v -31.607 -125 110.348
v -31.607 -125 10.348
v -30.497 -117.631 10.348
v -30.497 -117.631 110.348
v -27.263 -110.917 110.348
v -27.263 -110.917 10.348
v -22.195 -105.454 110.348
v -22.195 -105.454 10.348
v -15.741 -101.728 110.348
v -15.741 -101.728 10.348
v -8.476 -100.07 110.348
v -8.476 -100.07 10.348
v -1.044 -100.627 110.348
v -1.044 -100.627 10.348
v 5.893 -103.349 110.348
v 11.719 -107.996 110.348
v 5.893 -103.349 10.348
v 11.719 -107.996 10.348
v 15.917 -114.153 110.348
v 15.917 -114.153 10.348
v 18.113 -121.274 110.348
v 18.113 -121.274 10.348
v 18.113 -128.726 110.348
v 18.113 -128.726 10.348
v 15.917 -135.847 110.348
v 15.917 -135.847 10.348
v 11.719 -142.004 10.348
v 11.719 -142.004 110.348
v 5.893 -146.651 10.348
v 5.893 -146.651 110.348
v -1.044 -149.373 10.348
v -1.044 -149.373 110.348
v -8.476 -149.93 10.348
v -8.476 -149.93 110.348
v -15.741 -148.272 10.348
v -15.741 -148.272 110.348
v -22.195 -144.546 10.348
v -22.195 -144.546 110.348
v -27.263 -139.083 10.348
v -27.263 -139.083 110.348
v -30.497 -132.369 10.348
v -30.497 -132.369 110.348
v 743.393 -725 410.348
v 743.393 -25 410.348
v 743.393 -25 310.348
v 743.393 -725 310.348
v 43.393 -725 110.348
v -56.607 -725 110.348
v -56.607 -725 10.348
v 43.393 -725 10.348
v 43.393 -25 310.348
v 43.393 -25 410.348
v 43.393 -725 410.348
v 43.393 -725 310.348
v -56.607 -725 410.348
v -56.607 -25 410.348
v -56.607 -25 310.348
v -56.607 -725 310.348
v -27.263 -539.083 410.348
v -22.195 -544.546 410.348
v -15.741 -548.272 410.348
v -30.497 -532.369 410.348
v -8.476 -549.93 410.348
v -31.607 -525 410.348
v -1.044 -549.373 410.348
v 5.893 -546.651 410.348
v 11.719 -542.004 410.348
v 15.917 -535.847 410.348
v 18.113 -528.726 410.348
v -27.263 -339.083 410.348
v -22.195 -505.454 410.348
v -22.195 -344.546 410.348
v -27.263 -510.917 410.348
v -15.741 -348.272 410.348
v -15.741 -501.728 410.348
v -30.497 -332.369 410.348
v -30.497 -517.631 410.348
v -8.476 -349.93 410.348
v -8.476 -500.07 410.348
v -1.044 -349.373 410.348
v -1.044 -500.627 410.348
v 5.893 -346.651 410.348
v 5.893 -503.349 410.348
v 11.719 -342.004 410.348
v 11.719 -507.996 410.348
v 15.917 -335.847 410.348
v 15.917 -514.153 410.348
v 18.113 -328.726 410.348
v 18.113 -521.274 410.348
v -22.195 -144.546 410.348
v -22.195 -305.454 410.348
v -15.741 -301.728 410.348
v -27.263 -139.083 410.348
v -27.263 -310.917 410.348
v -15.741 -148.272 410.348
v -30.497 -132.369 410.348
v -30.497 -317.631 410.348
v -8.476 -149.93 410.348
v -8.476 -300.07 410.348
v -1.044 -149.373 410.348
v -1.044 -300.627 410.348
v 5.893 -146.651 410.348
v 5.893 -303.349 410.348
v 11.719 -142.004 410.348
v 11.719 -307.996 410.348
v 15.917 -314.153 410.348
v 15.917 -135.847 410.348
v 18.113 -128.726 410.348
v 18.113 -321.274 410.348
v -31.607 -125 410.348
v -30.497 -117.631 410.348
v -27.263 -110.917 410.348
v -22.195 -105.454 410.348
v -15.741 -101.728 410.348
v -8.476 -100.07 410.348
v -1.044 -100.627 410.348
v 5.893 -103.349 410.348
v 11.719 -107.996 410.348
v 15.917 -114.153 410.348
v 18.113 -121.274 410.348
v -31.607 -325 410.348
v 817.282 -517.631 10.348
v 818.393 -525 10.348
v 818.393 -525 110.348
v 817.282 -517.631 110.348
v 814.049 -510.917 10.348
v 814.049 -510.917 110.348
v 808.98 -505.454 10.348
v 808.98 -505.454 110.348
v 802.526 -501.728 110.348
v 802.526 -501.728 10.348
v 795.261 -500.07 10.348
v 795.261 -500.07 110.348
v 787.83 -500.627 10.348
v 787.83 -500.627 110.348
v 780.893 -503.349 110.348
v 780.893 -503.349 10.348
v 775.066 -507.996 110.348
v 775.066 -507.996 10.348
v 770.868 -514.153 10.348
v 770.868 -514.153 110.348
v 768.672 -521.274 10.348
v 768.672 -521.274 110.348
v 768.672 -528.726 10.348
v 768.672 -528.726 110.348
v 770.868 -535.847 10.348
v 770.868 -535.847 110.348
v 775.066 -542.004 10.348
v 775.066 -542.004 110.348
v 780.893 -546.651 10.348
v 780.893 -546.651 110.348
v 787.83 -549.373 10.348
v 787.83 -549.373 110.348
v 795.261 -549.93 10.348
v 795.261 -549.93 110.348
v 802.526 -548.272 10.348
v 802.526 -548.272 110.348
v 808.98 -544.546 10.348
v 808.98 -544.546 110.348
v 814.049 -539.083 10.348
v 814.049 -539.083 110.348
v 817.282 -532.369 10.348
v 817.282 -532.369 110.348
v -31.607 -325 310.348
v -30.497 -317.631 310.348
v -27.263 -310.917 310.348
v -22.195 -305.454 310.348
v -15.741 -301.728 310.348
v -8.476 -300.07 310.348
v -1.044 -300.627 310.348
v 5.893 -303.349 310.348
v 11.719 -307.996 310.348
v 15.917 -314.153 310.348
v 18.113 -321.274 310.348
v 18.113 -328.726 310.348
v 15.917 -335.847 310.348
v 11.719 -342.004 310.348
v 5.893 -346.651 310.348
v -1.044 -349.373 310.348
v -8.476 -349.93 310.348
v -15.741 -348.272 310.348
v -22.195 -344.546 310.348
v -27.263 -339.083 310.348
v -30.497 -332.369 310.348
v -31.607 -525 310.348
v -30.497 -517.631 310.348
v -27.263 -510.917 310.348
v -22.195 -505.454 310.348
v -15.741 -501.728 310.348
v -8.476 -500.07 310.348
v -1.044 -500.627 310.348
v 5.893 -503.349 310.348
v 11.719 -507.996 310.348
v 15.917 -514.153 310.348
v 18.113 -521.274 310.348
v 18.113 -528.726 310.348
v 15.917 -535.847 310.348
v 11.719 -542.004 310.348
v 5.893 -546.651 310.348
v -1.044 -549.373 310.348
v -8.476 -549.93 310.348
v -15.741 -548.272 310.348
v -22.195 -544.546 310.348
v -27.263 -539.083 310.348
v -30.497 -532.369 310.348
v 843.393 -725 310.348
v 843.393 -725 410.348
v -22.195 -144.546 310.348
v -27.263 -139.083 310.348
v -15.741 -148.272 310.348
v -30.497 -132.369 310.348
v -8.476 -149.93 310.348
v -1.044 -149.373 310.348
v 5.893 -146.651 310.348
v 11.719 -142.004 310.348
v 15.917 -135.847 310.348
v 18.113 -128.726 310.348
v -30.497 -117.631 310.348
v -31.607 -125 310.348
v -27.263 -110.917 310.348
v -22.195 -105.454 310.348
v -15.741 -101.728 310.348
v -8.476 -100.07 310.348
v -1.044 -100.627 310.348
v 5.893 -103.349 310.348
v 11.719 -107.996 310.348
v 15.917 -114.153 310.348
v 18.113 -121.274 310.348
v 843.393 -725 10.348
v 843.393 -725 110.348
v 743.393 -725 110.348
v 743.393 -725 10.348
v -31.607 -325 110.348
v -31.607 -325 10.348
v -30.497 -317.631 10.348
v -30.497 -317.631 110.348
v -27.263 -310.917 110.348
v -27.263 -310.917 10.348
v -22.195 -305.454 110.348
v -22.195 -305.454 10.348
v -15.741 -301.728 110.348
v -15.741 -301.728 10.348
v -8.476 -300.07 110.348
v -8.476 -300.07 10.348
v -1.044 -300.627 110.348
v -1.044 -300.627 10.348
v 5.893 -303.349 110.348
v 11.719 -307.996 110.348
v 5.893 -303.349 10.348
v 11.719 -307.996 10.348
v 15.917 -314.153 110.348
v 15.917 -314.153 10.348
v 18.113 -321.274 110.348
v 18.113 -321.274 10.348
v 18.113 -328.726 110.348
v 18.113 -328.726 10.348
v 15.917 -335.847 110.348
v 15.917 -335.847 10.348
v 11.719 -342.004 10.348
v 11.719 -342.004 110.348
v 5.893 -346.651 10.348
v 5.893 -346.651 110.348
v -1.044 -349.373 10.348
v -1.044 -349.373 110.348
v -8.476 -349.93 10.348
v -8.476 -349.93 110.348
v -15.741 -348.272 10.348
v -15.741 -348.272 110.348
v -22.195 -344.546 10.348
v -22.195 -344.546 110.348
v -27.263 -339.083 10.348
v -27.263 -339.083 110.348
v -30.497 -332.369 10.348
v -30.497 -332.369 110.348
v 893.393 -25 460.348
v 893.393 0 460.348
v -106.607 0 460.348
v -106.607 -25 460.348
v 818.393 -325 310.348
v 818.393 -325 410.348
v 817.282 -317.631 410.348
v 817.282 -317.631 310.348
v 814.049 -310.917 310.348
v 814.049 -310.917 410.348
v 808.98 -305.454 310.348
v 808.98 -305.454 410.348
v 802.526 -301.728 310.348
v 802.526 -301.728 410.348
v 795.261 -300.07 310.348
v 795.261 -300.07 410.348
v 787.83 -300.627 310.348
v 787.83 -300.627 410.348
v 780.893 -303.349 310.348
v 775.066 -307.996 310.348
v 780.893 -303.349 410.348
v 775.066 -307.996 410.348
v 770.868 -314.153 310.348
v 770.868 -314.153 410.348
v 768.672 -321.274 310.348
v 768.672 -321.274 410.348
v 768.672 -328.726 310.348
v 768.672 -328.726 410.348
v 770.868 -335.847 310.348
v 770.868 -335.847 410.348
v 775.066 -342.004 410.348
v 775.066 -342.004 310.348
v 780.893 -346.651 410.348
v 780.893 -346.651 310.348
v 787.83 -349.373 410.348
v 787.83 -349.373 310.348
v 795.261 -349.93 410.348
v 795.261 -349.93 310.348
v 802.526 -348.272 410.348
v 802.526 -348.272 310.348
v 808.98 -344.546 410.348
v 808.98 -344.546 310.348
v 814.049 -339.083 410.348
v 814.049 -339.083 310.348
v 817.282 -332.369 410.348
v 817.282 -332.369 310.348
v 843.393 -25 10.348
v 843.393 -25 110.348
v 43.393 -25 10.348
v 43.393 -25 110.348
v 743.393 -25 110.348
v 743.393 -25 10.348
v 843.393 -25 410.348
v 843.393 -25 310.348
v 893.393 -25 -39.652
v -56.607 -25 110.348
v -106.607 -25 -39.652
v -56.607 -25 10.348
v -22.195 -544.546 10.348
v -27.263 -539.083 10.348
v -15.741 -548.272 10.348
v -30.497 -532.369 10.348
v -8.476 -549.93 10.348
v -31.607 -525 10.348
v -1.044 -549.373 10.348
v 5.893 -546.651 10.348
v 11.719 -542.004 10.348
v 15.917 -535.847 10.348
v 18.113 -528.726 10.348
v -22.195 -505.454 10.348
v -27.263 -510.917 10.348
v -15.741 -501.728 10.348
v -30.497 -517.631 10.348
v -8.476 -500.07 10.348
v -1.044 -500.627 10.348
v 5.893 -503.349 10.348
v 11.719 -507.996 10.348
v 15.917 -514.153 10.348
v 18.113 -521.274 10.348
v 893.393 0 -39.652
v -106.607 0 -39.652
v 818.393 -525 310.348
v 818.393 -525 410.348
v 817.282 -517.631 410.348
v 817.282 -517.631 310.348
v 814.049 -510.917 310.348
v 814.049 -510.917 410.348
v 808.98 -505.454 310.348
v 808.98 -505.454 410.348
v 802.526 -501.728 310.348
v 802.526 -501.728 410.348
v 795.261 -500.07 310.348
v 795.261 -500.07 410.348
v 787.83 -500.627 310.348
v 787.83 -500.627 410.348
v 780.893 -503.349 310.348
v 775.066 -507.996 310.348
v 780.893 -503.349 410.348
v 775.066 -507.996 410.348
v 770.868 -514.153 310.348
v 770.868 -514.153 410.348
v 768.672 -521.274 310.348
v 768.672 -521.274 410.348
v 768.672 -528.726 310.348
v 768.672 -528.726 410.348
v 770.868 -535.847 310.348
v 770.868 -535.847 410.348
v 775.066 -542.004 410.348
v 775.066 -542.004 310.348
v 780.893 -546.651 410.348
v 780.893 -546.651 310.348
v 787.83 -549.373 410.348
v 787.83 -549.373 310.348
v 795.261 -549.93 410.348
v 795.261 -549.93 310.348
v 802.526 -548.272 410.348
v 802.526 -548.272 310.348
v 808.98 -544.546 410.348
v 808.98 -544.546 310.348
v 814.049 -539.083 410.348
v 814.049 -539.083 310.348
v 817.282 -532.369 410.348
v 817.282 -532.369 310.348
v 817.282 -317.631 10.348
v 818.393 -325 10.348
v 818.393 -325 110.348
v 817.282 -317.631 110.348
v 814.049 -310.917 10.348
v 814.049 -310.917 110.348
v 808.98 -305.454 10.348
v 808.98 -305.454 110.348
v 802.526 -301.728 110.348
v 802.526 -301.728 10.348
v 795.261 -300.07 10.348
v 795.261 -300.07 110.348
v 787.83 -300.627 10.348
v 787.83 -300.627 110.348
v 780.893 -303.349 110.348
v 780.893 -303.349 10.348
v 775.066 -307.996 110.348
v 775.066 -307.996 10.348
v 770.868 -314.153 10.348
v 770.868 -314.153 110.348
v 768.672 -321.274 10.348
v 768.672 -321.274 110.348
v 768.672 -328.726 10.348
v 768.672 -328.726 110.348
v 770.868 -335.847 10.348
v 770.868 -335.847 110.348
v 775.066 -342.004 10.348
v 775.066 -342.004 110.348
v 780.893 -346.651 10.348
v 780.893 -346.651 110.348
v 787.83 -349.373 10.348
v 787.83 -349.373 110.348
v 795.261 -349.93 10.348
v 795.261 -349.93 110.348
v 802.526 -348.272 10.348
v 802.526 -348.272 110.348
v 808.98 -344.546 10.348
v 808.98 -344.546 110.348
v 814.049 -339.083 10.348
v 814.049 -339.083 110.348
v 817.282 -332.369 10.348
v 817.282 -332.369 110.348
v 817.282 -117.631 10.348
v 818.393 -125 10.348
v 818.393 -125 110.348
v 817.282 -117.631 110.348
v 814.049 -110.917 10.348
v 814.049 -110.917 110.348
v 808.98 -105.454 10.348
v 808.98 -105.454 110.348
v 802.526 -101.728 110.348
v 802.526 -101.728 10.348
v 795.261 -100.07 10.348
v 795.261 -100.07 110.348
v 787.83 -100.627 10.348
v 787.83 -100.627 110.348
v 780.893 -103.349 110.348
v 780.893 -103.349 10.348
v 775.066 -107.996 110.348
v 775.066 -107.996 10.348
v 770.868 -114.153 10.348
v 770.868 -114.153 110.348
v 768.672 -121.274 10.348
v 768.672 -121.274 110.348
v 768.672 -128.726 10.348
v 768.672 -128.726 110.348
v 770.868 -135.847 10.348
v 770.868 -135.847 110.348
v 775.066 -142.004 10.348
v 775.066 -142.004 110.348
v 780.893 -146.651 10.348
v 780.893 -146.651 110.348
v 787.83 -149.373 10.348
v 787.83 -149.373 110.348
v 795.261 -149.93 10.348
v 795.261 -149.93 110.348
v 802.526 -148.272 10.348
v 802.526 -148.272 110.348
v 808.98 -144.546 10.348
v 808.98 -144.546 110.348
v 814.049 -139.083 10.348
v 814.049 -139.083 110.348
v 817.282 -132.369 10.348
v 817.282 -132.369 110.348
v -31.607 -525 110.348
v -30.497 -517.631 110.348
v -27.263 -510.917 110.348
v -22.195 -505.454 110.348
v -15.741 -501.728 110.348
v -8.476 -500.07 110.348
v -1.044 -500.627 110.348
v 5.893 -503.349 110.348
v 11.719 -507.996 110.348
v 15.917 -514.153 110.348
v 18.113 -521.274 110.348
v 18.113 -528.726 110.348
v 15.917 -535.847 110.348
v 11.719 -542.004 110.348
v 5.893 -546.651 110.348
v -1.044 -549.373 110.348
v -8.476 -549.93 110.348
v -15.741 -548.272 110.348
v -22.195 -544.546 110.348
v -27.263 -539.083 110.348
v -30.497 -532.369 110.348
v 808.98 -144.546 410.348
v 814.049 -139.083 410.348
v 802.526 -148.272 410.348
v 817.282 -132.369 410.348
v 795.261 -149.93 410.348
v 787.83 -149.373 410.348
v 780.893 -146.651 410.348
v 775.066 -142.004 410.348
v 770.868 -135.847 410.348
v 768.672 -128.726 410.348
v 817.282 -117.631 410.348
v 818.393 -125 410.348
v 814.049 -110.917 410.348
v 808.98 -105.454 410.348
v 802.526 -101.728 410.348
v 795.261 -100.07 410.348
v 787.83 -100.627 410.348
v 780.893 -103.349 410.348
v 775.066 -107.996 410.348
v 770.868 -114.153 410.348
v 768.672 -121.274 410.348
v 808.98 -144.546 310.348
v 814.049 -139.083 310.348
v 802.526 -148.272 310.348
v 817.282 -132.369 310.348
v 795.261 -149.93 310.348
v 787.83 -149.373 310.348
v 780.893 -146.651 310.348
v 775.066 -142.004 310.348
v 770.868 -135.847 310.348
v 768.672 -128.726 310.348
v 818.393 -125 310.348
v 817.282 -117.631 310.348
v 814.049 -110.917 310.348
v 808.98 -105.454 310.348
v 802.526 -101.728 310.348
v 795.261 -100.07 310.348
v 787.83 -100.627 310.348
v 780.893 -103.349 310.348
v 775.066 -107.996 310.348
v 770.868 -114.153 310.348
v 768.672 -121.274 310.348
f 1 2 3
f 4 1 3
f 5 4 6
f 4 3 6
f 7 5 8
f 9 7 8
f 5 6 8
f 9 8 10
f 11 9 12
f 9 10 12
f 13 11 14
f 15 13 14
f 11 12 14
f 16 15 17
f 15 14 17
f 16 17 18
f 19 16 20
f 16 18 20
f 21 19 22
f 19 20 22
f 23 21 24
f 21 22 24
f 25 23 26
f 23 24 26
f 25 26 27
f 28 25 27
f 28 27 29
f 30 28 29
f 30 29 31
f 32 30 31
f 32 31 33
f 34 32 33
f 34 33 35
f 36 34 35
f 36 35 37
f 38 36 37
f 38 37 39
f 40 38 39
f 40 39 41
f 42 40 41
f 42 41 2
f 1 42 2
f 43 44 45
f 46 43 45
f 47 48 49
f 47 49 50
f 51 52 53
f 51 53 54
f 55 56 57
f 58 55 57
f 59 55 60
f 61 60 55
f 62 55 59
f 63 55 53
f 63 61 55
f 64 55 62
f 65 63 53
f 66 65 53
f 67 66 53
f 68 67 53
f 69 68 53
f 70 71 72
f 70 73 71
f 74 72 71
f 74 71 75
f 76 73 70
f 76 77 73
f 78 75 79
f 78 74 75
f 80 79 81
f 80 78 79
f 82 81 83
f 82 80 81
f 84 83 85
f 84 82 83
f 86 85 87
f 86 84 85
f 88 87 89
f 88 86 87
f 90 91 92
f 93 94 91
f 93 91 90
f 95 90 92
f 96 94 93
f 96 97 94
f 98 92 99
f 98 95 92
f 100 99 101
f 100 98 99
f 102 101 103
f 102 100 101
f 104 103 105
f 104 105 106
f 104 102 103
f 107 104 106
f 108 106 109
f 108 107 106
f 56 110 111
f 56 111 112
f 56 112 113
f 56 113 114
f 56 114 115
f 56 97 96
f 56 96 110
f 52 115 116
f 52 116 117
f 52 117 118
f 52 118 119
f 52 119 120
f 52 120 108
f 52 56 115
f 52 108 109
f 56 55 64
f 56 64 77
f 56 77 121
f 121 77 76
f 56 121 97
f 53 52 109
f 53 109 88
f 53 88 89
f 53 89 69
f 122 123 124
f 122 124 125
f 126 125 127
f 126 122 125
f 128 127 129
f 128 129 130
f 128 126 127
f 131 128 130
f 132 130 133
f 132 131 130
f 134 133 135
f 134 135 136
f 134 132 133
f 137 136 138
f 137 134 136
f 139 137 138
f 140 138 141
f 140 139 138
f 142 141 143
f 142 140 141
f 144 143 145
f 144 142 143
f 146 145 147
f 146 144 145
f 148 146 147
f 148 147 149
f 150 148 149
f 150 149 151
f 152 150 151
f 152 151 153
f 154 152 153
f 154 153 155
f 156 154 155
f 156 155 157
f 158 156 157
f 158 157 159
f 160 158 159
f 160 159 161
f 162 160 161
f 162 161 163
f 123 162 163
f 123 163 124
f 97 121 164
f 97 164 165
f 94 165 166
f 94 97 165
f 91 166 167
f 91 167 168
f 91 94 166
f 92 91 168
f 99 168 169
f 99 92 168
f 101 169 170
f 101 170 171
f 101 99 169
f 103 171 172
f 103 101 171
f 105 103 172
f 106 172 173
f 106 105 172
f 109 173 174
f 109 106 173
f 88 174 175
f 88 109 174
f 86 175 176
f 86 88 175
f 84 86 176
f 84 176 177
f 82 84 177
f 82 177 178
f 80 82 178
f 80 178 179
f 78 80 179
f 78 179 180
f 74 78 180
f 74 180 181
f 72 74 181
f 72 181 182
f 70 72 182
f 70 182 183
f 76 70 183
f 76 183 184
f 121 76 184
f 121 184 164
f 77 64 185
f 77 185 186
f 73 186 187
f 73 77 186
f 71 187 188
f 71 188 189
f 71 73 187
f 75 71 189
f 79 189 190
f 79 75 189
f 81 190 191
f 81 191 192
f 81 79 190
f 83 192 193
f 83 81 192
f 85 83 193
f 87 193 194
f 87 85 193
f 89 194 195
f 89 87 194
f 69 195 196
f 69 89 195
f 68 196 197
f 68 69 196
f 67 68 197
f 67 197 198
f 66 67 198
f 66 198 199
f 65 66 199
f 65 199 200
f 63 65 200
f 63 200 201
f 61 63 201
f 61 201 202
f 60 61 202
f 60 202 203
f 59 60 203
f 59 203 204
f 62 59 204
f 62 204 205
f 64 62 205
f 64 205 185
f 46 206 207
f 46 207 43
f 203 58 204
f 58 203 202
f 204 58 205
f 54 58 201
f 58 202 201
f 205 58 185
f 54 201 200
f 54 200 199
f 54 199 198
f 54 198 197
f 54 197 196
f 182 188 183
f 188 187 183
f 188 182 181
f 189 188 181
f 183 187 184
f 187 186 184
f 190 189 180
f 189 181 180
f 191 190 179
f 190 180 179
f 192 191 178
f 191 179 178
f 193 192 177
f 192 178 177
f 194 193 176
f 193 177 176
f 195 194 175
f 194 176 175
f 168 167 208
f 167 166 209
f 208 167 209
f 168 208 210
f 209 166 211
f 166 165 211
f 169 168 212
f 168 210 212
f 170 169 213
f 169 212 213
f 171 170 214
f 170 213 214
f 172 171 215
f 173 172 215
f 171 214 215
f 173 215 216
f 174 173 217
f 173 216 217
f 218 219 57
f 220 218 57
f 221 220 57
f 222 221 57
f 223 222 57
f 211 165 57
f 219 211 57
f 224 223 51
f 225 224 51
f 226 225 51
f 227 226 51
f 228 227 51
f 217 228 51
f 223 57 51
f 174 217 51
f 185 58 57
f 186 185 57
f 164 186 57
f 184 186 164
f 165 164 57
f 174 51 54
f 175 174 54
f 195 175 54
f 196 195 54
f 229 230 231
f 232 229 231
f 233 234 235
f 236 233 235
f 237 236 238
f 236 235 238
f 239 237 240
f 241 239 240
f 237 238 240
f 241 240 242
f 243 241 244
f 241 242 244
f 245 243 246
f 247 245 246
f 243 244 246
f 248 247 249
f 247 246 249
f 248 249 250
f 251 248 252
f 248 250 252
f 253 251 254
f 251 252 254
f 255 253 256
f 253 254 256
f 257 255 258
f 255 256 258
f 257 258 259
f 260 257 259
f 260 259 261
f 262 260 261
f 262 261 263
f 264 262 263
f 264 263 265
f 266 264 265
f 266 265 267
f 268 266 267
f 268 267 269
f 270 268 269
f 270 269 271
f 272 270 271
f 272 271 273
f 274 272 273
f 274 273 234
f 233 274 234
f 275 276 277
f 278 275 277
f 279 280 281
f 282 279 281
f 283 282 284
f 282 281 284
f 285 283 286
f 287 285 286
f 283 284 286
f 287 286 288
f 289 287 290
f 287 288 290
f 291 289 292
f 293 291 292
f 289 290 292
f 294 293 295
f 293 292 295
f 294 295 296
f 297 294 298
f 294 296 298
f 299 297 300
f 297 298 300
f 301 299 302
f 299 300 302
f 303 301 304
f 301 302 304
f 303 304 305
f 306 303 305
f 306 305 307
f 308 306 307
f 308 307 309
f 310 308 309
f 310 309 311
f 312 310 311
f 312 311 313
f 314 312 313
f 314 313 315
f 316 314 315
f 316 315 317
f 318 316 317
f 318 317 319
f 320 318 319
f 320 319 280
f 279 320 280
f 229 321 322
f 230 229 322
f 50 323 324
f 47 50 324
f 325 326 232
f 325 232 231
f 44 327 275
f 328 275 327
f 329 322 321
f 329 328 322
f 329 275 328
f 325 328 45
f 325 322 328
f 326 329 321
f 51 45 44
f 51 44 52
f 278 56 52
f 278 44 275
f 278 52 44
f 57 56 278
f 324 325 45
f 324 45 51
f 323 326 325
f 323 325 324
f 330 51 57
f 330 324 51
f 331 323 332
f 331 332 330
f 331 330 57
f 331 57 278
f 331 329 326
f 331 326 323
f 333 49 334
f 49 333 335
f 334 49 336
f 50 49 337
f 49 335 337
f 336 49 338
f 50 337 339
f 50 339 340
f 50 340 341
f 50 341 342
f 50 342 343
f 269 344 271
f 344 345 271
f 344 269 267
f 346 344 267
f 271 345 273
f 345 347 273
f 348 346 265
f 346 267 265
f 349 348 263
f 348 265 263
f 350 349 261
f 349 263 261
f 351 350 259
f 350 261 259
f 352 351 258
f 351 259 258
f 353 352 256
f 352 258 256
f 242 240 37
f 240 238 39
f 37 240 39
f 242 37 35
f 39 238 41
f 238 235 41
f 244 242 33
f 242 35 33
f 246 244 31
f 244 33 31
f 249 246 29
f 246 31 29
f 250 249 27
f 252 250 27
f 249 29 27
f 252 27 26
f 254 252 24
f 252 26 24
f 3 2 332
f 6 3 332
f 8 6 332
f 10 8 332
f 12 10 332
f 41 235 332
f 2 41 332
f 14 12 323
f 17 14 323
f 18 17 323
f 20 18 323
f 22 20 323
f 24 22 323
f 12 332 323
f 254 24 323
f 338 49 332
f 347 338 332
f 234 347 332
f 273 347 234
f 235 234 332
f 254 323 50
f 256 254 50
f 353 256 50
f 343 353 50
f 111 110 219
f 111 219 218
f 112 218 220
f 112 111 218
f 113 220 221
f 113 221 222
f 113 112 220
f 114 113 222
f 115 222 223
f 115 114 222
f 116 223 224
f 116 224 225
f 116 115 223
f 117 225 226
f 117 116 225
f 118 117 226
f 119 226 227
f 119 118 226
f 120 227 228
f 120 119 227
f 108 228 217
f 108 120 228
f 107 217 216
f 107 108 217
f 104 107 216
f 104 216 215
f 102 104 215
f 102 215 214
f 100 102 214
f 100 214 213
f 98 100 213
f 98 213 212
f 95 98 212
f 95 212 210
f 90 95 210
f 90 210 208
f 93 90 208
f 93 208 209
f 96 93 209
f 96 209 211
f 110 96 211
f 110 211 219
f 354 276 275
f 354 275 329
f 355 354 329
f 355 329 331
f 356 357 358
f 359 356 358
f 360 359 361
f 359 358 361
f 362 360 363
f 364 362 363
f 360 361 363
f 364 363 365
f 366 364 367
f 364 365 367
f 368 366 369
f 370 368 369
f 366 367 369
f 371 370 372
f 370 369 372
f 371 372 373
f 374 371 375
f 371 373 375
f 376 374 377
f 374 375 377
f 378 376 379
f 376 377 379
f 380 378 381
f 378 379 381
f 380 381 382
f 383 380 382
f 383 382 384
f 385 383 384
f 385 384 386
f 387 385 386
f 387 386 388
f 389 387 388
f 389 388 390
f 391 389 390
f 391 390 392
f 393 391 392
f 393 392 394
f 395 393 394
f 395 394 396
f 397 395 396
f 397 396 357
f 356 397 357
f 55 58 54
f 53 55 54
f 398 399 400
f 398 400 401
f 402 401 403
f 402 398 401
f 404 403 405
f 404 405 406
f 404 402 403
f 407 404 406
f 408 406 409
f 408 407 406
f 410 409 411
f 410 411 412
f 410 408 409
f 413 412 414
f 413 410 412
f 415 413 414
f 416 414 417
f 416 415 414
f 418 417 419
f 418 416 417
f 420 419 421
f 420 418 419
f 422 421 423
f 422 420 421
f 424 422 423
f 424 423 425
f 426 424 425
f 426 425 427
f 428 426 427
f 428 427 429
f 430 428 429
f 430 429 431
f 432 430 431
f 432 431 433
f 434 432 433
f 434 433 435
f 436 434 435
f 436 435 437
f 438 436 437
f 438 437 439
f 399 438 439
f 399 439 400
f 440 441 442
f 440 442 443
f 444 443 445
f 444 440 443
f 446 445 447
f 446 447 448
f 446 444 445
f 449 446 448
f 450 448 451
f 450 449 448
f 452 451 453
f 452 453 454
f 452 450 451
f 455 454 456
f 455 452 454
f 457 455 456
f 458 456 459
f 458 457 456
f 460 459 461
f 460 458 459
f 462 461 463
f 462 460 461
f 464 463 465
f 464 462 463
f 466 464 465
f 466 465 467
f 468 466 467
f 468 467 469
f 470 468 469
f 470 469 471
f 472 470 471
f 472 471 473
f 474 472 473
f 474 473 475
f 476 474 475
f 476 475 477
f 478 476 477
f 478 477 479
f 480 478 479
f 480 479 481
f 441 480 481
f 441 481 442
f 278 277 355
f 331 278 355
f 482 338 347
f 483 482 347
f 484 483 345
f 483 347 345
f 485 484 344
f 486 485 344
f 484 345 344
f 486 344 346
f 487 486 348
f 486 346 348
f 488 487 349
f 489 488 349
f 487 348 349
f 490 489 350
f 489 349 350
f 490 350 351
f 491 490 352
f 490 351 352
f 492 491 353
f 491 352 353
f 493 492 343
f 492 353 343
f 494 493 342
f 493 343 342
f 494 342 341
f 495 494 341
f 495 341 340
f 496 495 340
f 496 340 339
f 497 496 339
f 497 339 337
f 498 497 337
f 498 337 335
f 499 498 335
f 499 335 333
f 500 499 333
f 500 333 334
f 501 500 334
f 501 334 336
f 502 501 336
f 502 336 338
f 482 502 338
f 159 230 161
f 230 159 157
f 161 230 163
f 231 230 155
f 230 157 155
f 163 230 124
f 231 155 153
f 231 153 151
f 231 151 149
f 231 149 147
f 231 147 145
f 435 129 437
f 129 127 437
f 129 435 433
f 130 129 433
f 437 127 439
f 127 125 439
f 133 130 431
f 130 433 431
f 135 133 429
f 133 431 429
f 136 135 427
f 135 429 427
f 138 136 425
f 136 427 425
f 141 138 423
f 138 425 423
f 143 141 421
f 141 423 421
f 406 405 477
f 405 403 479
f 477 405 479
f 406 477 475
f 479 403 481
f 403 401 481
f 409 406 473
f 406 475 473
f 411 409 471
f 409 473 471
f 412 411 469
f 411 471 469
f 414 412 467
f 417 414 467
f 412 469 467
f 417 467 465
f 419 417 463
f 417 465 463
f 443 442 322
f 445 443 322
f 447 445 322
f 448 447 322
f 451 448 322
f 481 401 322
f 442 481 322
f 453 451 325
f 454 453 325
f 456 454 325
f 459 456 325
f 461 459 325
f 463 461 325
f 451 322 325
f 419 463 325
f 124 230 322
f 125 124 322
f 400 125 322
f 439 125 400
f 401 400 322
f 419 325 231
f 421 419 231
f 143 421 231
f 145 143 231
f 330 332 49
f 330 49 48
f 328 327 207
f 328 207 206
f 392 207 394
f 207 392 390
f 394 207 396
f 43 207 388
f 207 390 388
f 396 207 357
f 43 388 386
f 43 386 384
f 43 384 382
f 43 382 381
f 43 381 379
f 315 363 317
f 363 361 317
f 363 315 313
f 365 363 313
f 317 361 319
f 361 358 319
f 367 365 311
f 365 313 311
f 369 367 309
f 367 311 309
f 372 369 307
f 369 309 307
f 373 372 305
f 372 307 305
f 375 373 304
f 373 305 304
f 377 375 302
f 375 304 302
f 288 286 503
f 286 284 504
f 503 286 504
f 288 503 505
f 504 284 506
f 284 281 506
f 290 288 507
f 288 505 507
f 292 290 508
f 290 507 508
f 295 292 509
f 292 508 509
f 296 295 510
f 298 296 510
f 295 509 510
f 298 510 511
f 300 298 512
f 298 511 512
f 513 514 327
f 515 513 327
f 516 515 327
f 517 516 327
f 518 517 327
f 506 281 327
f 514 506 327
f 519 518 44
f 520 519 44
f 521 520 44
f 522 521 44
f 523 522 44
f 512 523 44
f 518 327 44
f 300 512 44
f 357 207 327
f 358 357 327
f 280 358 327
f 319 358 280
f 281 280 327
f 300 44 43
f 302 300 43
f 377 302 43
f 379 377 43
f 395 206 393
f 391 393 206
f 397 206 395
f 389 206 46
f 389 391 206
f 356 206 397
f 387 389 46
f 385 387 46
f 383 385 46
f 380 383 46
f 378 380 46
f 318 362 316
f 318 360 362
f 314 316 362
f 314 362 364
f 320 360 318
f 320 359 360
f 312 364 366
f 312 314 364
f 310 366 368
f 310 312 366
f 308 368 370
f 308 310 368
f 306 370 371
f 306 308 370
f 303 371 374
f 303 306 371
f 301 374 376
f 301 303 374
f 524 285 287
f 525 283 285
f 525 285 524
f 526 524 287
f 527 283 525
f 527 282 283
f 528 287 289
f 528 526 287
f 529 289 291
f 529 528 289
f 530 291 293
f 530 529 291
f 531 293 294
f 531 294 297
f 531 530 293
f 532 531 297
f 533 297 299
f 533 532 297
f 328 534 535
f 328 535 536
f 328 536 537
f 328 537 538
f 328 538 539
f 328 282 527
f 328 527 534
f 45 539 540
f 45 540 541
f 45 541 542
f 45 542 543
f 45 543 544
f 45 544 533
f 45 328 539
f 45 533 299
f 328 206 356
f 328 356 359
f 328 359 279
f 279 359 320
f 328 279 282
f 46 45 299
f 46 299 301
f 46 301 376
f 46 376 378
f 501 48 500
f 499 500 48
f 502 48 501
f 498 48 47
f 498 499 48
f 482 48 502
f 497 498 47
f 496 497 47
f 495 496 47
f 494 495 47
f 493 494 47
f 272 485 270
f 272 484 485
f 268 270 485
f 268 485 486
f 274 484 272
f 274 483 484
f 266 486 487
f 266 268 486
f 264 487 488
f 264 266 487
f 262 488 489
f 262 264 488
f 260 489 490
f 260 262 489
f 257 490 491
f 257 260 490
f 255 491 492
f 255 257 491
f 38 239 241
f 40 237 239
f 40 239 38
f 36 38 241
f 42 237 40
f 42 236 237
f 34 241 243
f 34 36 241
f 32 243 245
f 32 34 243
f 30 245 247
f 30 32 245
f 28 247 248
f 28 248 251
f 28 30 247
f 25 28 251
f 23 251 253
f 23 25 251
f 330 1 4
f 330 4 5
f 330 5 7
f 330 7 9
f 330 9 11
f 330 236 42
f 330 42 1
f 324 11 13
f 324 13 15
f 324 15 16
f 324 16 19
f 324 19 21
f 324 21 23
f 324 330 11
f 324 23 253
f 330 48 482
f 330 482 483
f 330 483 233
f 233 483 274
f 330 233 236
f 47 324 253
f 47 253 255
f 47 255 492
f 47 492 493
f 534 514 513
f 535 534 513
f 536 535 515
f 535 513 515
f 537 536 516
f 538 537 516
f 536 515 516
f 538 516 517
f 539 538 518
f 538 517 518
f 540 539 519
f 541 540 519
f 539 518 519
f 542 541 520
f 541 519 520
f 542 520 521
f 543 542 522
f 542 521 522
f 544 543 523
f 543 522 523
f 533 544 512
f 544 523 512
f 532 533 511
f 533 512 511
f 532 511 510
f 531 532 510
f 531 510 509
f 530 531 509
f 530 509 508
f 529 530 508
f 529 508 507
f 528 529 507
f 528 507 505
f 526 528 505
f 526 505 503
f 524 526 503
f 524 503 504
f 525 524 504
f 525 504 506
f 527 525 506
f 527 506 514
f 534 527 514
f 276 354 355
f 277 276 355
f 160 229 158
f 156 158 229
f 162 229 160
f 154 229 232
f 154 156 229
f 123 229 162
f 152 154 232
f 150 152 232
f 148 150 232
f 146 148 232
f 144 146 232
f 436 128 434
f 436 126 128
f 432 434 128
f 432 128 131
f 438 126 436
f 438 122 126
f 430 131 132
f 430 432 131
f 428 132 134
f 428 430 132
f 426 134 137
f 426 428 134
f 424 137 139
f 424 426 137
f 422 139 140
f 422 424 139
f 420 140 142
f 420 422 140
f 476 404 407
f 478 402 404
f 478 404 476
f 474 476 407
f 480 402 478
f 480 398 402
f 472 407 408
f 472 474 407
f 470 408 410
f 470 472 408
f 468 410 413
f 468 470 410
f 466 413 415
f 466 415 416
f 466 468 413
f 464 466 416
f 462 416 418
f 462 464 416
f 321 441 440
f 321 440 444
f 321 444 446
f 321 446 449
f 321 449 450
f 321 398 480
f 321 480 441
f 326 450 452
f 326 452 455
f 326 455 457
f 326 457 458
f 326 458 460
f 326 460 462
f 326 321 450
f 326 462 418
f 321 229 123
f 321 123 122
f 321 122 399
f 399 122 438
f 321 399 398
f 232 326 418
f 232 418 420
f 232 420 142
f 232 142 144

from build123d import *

# Parameters (mm, degrees)
F0_W     = 500
F0_H     = 250
F1_DEPTH = 25
F2_W     = 100
F2_H     = 100
F3_DEPTH = 725
F5_D     = 50


with BuildPart() as f1:
    # F0 (on Front) → F1 (new body)
    with BuildSketch(Plane.XZ):
        with Locations((143.392576, 85.347861)):
            Rectangle(F0_W, F0_H)
    extrude(amount=F1_DEPTH)

    # F2 (on Front) → F3 (join)
    with BuildSketch(Plane.XZ):
        with Locations((-6.607424, 60.347861)):
            Rectangle(F2_W, F2_H)
    extrude(amount=F3_DEPTH)

    # F5 (through all)
    with Locations(Plane.XY.offset(110.347861)):
        with Locations((-6.607424, -125), (-6.607424, -325), (-6.607424, -525)):
            Hole(F5_D / 2)

    # F7: F1 across plane


with BuildPart() as f1_1:
    add(f1.part)
    add(f1.part.mirror(Plane(origin=(393.392576, -12.5, 85.347861), x_dir=(0, 1, 0), z_dir=(1, 0, 0))))

    # F9: F1 across plane


with BuildPart() as f1_2:
    add(f1_1.part)
    add(f1_1.part.mirror(Plane(origin=(393.392576, -12.5, 210.347861), x_dir=(1, 0, 0), z_dir=(0, 0, 1))))


solid = f1_2.part
